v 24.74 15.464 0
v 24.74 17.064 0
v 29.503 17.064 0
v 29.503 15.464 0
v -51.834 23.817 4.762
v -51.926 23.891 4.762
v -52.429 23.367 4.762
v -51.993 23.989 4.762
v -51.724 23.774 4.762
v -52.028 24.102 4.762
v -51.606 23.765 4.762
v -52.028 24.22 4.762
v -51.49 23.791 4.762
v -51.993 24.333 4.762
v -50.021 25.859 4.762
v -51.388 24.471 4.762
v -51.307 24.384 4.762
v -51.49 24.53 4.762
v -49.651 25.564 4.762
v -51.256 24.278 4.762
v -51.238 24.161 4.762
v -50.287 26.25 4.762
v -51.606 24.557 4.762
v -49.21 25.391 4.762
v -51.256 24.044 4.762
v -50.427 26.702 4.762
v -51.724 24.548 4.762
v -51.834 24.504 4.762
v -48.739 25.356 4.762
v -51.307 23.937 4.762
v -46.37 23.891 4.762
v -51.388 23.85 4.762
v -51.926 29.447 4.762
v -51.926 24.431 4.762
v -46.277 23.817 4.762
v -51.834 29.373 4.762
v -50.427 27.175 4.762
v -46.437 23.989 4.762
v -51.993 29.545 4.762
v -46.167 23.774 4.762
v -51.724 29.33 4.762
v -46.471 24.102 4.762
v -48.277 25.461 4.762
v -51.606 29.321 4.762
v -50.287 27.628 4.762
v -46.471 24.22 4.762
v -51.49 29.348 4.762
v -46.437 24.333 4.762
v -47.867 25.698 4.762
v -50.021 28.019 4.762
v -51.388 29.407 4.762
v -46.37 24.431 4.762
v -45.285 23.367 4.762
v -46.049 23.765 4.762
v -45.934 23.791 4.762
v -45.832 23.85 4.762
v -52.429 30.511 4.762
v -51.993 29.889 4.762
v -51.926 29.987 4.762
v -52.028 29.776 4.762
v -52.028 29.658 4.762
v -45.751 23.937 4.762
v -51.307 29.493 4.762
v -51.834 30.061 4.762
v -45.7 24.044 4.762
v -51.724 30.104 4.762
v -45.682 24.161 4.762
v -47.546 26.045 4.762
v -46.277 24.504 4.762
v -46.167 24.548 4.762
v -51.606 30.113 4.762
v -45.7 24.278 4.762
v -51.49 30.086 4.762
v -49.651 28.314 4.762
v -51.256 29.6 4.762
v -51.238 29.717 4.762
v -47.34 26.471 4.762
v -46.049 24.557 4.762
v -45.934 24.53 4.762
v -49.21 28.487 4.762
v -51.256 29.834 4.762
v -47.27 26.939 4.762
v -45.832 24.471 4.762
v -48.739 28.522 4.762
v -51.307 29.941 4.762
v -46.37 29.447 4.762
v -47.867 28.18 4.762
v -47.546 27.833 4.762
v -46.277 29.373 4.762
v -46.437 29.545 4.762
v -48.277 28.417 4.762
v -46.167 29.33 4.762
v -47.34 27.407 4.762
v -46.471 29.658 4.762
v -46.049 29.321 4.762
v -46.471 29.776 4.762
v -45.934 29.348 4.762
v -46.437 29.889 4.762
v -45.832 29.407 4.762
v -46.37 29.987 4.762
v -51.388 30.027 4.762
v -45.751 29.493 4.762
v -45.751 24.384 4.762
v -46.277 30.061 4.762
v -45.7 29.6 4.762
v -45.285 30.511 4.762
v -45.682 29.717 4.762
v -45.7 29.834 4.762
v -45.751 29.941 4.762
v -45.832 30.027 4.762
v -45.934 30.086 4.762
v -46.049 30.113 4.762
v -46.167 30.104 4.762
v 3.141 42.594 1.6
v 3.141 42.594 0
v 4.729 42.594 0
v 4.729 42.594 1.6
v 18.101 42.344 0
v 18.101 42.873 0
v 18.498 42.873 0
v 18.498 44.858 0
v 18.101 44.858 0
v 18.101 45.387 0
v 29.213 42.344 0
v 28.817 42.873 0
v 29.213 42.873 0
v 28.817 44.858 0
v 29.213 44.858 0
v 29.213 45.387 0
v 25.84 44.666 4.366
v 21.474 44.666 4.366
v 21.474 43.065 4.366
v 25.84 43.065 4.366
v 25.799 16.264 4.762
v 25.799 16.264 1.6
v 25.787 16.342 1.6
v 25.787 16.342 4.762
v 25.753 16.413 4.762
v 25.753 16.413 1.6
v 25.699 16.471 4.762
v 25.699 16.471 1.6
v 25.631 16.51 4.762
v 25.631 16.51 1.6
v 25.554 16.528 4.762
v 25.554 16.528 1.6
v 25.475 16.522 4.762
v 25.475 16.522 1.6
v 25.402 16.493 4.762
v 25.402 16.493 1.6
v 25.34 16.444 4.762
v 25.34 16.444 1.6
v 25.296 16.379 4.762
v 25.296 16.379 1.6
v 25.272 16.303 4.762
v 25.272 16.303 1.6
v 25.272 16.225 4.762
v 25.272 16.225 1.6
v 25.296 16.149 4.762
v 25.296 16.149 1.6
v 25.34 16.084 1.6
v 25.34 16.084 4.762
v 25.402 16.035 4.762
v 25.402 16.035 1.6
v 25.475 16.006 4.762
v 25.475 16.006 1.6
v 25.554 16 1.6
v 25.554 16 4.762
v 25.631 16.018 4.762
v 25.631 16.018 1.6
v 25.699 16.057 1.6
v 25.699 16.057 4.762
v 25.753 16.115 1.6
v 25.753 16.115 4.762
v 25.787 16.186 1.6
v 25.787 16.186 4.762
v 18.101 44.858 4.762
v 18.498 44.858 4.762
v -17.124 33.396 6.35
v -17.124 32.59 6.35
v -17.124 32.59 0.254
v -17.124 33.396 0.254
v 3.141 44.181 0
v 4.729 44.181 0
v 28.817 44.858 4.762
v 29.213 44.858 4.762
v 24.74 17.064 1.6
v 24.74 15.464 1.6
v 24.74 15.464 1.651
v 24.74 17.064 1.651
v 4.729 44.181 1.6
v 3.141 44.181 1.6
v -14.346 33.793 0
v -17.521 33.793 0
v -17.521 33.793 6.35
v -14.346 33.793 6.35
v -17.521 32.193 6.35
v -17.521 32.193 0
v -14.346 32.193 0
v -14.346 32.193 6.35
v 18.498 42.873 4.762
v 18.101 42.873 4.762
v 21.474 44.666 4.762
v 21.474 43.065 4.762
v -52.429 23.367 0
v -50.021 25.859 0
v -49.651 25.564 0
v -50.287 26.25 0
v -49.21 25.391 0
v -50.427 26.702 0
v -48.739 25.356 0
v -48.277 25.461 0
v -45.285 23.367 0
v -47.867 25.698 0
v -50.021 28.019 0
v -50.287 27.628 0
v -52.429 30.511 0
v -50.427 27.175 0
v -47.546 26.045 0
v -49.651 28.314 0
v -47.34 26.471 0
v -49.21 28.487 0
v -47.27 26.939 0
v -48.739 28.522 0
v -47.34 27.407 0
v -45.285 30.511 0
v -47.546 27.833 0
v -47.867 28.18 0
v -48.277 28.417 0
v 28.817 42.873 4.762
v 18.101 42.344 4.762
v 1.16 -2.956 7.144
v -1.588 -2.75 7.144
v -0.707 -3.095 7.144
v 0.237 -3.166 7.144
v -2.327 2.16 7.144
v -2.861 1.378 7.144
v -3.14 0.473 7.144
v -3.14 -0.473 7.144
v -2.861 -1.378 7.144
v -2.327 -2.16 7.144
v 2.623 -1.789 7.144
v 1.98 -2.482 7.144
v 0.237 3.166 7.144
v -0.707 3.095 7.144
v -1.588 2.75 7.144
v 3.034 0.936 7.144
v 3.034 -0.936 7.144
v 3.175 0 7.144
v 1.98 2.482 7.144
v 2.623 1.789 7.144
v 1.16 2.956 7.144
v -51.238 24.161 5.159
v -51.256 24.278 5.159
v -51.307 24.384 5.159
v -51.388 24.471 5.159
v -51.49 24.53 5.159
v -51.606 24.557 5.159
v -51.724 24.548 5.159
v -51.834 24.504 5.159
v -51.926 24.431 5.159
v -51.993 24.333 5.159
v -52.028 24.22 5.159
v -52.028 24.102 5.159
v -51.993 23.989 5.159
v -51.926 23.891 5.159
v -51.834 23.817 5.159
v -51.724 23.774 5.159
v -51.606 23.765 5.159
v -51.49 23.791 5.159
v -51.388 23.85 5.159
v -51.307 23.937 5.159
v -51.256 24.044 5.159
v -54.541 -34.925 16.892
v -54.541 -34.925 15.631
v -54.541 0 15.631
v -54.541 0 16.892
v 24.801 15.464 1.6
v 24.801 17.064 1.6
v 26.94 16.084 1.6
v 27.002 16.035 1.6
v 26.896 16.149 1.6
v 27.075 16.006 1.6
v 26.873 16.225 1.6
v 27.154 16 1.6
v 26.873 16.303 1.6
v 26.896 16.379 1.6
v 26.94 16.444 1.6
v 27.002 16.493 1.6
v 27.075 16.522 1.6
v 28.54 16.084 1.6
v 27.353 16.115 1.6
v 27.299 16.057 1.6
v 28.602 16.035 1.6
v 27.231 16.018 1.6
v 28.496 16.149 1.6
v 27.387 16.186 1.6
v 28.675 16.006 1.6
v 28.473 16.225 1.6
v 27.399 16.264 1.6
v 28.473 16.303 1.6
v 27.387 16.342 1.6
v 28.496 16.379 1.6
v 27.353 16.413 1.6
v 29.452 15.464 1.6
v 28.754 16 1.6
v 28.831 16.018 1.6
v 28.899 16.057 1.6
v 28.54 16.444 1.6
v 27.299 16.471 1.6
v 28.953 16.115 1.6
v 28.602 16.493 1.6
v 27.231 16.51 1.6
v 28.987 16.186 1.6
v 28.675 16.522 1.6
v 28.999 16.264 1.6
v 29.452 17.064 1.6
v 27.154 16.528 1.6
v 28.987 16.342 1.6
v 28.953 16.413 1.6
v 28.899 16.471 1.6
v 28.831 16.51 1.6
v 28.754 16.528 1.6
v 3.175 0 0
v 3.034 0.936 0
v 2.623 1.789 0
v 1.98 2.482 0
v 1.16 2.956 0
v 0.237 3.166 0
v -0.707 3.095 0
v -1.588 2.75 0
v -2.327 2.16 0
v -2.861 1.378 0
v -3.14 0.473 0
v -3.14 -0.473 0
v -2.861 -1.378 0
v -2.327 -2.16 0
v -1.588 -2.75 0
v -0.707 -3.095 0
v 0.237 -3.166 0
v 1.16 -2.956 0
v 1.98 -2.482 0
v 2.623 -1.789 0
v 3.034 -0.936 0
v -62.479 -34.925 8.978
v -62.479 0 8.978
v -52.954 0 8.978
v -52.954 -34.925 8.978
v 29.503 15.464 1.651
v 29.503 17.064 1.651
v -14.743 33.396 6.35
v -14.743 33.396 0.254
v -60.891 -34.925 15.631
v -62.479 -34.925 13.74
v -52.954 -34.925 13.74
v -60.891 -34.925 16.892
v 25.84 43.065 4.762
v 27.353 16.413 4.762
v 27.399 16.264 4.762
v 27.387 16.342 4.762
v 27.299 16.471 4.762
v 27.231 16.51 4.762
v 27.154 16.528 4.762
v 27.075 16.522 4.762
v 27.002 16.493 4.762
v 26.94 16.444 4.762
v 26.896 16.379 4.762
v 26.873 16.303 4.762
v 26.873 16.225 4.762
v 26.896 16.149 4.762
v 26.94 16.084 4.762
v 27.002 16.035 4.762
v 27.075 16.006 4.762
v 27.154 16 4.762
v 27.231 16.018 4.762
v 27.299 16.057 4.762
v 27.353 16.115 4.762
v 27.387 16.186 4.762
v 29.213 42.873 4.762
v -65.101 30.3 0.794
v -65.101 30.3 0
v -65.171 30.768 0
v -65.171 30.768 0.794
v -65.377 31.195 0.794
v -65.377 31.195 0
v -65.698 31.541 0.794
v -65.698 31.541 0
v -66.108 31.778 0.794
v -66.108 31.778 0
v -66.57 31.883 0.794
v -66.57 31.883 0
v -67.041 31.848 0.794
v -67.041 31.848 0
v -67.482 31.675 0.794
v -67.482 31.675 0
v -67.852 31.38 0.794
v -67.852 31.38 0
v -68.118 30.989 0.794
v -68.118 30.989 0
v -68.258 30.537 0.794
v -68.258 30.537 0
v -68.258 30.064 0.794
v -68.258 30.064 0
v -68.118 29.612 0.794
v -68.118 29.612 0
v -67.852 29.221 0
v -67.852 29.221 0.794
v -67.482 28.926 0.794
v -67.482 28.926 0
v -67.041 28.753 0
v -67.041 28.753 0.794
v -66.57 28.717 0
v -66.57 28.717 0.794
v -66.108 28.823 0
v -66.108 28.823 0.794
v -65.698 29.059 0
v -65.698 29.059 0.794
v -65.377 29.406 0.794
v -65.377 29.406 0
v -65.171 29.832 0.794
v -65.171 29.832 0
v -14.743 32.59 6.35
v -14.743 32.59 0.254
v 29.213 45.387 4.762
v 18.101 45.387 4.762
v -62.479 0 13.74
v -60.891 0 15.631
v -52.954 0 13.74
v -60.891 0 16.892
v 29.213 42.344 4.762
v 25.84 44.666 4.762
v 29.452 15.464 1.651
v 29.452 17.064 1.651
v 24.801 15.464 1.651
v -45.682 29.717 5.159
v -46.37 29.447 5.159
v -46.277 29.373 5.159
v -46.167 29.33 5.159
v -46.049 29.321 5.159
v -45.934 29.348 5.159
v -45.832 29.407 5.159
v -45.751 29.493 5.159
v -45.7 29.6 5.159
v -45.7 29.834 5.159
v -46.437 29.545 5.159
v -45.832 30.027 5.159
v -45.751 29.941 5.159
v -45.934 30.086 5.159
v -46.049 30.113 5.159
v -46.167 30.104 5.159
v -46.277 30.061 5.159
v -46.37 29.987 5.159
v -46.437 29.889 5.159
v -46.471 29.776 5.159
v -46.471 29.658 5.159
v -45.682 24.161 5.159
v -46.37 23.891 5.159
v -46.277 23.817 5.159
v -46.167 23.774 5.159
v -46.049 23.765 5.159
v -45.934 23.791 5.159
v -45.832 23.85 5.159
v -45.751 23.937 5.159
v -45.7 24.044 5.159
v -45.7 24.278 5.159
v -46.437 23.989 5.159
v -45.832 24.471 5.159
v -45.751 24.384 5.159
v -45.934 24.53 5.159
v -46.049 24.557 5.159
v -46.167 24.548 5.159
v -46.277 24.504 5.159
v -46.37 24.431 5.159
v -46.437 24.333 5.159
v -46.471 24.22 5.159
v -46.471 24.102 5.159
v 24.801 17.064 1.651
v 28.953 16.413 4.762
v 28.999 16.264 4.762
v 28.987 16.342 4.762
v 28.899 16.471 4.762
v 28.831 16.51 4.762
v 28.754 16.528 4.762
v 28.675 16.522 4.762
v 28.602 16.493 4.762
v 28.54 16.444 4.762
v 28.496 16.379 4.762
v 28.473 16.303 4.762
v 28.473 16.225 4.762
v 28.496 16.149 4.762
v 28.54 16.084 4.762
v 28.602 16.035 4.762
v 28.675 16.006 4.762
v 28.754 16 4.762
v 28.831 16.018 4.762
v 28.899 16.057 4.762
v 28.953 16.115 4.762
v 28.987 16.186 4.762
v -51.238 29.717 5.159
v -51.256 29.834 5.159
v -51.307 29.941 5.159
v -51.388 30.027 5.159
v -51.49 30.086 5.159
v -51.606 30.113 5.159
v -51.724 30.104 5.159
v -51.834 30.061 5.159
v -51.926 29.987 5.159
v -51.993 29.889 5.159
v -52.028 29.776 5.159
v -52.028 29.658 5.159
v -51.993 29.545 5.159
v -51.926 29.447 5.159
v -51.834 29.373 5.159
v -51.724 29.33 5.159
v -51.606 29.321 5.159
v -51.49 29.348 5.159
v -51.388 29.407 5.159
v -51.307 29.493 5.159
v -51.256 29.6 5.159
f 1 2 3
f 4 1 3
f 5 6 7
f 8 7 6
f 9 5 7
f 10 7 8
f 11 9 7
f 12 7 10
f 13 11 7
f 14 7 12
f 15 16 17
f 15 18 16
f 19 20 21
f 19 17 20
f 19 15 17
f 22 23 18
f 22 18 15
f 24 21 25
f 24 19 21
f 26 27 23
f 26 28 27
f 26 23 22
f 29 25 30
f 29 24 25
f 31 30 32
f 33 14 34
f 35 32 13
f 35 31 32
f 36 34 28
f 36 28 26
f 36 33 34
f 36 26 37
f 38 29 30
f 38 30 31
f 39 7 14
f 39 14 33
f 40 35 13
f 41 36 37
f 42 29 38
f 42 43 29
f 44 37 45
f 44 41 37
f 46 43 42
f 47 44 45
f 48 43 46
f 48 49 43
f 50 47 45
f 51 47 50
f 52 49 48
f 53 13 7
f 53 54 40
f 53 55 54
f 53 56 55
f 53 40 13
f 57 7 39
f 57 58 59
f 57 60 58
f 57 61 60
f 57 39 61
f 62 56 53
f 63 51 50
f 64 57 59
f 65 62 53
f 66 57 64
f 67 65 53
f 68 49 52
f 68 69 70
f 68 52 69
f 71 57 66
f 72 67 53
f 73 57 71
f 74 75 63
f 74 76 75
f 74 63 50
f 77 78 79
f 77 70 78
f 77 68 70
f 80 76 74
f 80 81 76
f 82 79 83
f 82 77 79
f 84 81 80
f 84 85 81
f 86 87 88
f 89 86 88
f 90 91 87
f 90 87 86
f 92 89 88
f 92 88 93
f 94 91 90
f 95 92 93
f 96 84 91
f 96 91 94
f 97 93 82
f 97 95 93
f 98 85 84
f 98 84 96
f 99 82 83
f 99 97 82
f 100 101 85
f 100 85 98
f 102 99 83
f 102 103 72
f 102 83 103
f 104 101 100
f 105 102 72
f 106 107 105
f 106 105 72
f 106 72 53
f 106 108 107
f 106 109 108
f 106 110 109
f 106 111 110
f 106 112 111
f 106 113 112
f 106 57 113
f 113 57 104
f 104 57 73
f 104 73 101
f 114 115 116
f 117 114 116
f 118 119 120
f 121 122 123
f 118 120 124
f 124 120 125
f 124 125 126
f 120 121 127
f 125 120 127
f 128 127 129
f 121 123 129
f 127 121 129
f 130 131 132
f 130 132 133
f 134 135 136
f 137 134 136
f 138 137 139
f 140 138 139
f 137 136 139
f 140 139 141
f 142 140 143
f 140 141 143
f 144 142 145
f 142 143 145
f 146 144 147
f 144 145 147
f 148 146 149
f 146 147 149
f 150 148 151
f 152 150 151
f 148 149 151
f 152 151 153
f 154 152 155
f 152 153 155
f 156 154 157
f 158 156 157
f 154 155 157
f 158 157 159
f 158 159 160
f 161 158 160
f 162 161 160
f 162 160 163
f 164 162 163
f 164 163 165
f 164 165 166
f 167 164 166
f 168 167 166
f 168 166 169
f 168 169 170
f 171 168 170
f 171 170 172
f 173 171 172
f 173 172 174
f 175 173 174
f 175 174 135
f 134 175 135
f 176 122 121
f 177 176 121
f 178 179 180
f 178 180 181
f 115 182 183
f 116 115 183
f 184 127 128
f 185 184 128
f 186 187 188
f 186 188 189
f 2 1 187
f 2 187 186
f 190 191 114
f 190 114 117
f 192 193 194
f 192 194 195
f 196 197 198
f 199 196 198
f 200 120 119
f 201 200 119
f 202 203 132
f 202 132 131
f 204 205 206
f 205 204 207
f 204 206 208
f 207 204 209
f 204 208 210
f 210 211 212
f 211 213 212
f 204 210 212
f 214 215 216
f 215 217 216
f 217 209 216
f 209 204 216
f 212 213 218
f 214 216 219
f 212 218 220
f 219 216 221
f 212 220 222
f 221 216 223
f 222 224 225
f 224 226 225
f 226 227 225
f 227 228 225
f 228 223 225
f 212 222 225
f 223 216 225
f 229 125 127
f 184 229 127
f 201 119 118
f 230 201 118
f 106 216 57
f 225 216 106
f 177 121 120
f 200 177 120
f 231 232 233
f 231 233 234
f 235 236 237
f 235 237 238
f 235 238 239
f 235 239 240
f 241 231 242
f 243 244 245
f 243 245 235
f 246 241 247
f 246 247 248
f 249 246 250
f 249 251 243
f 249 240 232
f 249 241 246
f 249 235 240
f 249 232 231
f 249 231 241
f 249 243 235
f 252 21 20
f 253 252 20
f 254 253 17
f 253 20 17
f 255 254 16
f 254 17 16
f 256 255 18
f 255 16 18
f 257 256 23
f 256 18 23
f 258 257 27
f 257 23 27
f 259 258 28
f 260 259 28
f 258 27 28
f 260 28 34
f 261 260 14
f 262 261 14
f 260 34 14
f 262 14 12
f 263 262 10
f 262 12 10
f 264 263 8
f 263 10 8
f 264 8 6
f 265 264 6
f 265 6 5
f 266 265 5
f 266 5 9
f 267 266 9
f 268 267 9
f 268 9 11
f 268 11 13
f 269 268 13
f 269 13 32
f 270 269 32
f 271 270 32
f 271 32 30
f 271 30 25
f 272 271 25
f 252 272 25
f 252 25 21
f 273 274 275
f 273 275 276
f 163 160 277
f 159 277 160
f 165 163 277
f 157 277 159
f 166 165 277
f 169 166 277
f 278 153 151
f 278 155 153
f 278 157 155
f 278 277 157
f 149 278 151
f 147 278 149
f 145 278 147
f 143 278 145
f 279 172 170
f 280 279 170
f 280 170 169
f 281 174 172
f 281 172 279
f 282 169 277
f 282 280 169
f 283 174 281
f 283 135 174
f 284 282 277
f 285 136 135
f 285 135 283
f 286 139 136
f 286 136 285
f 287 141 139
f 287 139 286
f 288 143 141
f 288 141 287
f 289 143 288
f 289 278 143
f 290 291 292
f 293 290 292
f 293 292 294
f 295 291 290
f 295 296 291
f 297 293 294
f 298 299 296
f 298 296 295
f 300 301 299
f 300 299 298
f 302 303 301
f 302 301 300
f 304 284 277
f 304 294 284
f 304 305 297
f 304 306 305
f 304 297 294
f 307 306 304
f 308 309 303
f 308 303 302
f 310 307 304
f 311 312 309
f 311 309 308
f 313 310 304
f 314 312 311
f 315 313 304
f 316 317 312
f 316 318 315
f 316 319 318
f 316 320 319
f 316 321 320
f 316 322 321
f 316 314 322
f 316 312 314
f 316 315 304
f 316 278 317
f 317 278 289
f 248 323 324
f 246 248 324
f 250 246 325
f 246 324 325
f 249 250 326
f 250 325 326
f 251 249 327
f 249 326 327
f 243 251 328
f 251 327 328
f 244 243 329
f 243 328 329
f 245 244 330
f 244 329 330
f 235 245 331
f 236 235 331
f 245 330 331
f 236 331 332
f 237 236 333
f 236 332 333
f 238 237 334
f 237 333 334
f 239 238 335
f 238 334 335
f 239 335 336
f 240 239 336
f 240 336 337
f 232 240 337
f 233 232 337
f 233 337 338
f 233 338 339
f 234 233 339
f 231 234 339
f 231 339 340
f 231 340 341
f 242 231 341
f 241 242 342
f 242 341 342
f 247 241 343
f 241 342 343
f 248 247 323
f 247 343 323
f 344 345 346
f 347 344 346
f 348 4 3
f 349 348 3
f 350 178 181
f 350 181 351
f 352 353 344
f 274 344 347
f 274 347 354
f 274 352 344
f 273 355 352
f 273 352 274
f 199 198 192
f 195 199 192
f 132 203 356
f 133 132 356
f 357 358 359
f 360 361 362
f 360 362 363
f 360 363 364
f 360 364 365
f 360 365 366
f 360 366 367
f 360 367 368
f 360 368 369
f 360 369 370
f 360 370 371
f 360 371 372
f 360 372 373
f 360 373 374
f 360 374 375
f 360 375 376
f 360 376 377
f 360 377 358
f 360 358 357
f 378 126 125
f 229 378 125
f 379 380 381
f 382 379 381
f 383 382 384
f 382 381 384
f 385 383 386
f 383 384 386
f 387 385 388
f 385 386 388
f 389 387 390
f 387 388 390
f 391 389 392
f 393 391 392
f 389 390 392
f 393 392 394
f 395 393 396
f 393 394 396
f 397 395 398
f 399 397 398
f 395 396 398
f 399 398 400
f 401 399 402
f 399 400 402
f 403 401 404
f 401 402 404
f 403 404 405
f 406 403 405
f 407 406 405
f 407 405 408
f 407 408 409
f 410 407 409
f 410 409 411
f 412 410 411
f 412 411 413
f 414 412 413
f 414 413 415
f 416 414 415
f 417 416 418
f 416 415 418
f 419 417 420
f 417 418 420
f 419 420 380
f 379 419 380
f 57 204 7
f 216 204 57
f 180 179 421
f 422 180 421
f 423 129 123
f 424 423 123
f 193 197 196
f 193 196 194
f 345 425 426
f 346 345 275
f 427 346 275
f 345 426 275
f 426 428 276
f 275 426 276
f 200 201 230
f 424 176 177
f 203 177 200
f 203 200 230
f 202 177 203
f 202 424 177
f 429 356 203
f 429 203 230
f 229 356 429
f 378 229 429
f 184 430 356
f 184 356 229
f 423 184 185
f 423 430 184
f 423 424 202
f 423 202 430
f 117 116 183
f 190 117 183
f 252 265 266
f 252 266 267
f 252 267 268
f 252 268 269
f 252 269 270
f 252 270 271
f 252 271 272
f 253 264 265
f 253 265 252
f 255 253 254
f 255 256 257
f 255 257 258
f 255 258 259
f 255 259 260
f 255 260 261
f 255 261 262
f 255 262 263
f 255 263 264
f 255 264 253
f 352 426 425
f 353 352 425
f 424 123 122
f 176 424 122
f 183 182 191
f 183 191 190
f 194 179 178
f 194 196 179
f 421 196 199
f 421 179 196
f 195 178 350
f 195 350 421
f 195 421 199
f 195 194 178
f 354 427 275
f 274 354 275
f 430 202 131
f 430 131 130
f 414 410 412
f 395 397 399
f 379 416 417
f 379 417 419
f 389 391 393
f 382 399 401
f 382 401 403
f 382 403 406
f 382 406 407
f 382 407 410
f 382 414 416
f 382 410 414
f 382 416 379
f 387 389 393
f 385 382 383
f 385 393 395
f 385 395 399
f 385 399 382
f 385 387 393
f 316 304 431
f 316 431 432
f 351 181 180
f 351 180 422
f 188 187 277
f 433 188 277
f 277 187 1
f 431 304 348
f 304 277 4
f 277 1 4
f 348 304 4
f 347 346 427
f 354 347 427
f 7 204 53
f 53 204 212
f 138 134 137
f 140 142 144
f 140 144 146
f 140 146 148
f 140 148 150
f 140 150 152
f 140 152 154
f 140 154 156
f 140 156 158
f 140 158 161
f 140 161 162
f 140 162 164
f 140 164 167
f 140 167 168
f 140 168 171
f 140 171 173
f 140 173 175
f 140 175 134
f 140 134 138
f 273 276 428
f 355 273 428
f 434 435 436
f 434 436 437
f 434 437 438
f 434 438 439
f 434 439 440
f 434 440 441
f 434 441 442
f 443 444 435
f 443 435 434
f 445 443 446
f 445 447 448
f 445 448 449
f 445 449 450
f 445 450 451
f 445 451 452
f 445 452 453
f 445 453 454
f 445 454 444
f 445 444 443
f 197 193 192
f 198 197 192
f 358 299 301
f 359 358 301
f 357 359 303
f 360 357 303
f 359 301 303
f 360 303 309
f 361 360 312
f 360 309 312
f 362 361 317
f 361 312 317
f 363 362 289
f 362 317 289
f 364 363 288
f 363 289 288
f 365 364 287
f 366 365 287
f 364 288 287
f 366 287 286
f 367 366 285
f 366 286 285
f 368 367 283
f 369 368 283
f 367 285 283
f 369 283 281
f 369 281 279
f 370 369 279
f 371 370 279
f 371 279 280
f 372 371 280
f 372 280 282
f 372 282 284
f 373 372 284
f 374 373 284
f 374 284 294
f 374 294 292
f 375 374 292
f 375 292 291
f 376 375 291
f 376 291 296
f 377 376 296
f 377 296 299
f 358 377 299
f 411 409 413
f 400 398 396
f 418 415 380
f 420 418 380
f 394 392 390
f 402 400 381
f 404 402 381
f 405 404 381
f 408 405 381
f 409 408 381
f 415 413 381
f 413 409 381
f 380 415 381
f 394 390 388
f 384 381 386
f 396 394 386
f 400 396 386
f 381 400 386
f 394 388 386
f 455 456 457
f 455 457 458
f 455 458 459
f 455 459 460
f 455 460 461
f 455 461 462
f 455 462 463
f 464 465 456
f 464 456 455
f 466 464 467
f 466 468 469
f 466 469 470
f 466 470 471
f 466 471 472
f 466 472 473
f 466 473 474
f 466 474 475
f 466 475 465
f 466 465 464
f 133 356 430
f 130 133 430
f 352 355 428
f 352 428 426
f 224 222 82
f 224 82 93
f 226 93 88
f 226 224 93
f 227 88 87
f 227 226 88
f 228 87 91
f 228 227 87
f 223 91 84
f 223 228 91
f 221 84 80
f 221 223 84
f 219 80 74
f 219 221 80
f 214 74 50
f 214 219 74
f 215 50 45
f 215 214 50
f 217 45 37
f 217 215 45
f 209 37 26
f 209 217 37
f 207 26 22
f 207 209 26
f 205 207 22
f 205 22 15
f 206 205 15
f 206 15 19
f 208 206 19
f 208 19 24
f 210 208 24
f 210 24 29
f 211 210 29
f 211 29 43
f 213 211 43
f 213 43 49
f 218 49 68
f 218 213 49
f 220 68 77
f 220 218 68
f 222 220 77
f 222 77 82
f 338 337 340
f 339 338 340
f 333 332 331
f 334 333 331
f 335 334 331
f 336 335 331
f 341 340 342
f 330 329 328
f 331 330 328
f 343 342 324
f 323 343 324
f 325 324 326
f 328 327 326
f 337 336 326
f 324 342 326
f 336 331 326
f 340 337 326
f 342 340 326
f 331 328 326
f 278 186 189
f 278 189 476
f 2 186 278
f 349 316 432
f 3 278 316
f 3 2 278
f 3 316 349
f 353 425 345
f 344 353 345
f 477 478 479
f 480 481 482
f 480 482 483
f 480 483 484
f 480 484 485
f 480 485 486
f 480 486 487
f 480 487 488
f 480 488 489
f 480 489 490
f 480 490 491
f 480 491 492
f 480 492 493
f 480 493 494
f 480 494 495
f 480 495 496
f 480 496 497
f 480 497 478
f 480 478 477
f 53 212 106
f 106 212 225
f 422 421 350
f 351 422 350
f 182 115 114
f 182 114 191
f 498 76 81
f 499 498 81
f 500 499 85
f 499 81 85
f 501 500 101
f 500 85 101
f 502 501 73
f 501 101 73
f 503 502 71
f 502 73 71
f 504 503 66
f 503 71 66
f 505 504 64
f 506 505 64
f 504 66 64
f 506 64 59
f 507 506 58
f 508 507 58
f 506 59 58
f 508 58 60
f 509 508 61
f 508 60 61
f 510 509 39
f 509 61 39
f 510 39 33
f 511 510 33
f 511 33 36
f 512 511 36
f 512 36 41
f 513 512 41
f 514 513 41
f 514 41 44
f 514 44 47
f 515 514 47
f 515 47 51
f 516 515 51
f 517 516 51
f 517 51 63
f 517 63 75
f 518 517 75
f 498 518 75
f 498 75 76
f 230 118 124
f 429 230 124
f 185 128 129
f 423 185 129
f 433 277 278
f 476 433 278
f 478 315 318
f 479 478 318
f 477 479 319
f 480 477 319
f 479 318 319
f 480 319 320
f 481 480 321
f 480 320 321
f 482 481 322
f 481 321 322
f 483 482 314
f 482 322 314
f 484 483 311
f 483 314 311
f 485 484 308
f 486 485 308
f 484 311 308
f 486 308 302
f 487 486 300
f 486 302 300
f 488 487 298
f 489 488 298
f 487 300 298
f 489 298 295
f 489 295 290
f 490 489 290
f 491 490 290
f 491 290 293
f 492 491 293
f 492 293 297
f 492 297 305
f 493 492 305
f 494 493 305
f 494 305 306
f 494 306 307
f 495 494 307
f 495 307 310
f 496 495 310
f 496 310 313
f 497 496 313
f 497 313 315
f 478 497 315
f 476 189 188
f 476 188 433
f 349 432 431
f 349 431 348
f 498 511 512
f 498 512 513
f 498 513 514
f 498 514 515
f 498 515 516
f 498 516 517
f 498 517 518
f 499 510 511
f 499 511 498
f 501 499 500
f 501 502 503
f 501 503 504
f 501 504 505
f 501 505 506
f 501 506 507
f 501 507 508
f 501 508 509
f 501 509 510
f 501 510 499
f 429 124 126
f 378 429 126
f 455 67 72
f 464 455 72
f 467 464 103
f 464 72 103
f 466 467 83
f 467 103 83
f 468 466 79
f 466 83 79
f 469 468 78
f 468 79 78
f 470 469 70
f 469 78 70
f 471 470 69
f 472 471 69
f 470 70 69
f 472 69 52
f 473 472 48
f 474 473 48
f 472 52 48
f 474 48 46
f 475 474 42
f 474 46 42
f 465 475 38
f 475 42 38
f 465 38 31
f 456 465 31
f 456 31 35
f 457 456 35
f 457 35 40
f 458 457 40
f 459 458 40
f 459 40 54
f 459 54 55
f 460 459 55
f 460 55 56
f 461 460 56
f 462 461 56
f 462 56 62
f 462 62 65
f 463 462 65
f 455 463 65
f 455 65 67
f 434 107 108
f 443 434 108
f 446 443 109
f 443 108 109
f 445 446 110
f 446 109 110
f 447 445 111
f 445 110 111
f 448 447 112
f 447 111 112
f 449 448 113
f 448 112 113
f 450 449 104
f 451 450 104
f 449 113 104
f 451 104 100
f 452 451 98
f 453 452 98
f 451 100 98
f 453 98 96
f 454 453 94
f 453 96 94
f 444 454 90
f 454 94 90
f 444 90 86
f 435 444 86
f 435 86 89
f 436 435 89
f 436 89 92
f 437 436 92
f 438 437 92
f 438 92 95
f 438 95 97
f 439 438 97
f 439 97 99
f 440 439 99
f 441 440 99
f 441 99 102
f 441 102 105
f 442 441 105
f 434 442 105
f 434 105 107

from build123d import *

# Parameters (mm, degrees)
F0_R      = 3.175
F1_DEPTH  = 7.14375
F3_DEPTH  = 34.925
F4_W      = 7.14375
F4_H      = 7.14375
F4_R      = 0.396875
F4_R_2    = 1.5875
F5_DEPTH  = 4.7625
F6_DEPTH  = 5.159375
F8_DEPTH  = 4.7625
F9_W      = 4.365625
F9_H      = 1.6002
F10_DEPTH = 0.396875
F11_W     = 1.5875
F11_H     = 1.5875
F12_DEPTH = 1.6002
F13_W     = 4.7625
F13_H     = 1.6002
F13_R     = 0.2645833333
F14_DEPTH = 1.6002
F15_DEPTH = 4.7625
F16_W     = 3.175
F16_H     = 1.6002
F17_DEPTH = 6.35
F18_W     = 2.38125
F18_H     = 0.80645
F19_DEPTH = 6.096
F20_W     = 0.0608872609
F20_H     = 1.6002
F20_W_2   = 0.0508
F21_DEPTH = 0.0508
F22_R     = 1.5875
F23_DEPTH = 0.79375


# Not quite as in the source:
# - a length typed as a fraction of an inch, garbled in the dataset ("3 / 203.2 mm" for 3/8 in), is restored


with BuildPart() as f1:
    # F0 (on Top) → F1 (new body)
    with BuildSketch(Plane.XY):
        Circle(F0_R)
    extrude(amount=F1_DEPTH)


with BuildPart() as f3:
    # F2 (on Front) → F3 (new body)
    with BuildSketch(Plane.XZ):
        Polygon((-60.8911556599, 15.6311627035), (-62.4786556599, 13.7401700254), (-62.4786556599, 8.9776700254), (-52.9536556599, 8.9776700254), (-52.9536556599, 13.7401700254), (-54.5411556599, 15.6311627035), (-54.5411556599, 16.8918247443), (-60.8911556599, 16.8918247443), align=None)
    extrude(amount=F3_DEPTH)


with BuildPart() as f5:
    # F4 (on Top) → F5 (new body)
    with BuildSketch(Plane.XY):
        with Locations((-48.8571682945, 26.9388640299)):
            Rectangle(F4_W, F4_H)
        with Locations((-51.6352932945, 24.1607390299)):
            Circle(F4_R, mode=Mode.SUBTRACT)
        with Locations((-46.0790432945, 24.1607390299)):
            Circle(F4_R, mode=Mode.SUBTRACT)
        with Locations((-51.6352932945, 29.7169890299)):
            Circle(F4_R, mode=Mode.SUBTRACT)
        with Locations((-48.8571682945, 26.9388640299)):
            Circle(F4_R_2, mode=Mode.SUBTRACT)
        with Locations((-46.0790432945, 29.7169890299)):
            Circle(F4_R, mode=Mode.SUBTRACT)
    extrude(amount=F5_DEPTH)

    # F4 (on Top) → F6 (join)
    with BuildSketch(Plane.XY):
        with Locations((-51.6352932945, 29.7169890299)):
            Circle(F4_R)
        with Locations((-46.0790432945, 29.7169890299)):
            Circle(F4_R)
        with Locations((-46.0790432945, 24.1607390299)):
            Circle(F4_R)
        with Locations((-51.6352932945, 24.1607390299)):
            Circle(F4_R)
    extrude(amount=F6_DEPTH)


with BuildPart() as f8:
    # F7 (on Top) → F8 (new body)
    with BuildSketch(Plane.XY):
        Polygon((29.2134701102, 45.3868062362), (18.1009701102, 45.3868062362), (18.1009701102, 44.8576395696), (18.4978451102, 44.8576395696), (18.4978451102, 42.8732645696), (18.1009701102, 42.8732645696), (18.1009701102, 42.3440979029), (29.2134701102, 42.3440979029), (29.2134701102, 42.8732645696), (28.8165951102, 42.8732645696), (28.8165951102, 44.8576395696), (29.2134701102, 44.8576395696), align=None)
    extrude(amount=F8_DEPTH)

    # F9 (on face) → F10 (cut)
    with BuildSketch(Plane.XY.offset(4.7625)):
        with Locations((23.6572201102, 43.8654520696)):
            Rectangle(F9_W, F9_H)
    extrude(amount=-F10_DEPTH, mode=Mode.SUBTRACT)


with BuildPart() as f12:
    # F11 (on Top) → F12 (new body)
    with BuildSketch(Plane.XY):
        with Locations((3.9349747822, 43.3876775205)):
            Rectangle(F11_W, F11_H)
    extrude(amount=F12_DEPTH)


with BuildPart() as f14:
    # F13 (on Top) → F14 (new body)
    with BuildSketch(Plane.XY):
        with Locations((27.1214717252, 16.2639711052)):
            Rectangle(F13_W, F13_H)
        with Locations((25.5339717252, 16.2639711052)):
            Circle(F13_R, mode=Mode.SUBTRACT)
        with Locations((27.1341717252, 16.2639711052)):
            Circle(F13_R, mode=Mode.SUBTRACT)
        with Locations((28.7343717252, 16.2639711052)):
            Circle(F13_R, mode=Mode.SUBTRACT)
    extrude(amount=F14_DEPTH)

    # F13 (on Top) → F15 (join)
    with BuildSketch(Plane.XY):
        with Locations((25.5339717252, 16.2639711052)):
            Circle(F13_R)
        with Locations((27.1341717252, 16.2639711052)):
            Circle(F13_R)
        with Locations((28.7343717252, 16.2639711052)):
            Circle(F13_R)
    extrude(amount=F15_DEPTH)

    # F20 (on face) → F21 (join)
    with BuildSketch(Plane.XY.offset(1.6002)):
        with Locations((24.7706653557, 16.2639711052)):
            Rectangle(F20_W, F20_H)
        with Locations((29.4773217252, 16.2639711052)):
            Rectangle(F20_W_2, F20_H)
    extrude(amount=F21_DEPTH)


with BuildPart() as f17:
    # F16 (on Top) → F17 (new body)
    with BuildSketch(Plane.XY):
        with Locations((-15.9334428608, 32.9927906)):
            Rectangle(F16_W, F16_H)
    extrude(amount=F17_DEPTH)

    # F18 (on face) → F19 (cut)
    with BuildSketch(Plane.XY.offset(6.35)):
        with Locations((-15.9334428608, 32.9927906)):
            Rectangle(F18_W, F18_H)
    extrude(amount=-F19_DEPTH, mode=Mode.SUBTRACT)


with BuildPart() as f23:
    # F22 (on Top) → F23 (new body)
    with BuildSketch(Plane.XY):
        with Locations((-66.6881874204, 30.300328508)):
            Circle(F22_R)
    extrude(amount=F23_DEPTH)


solid = Compound([f1.part, f3.part, f5.part, f8.part, f12.part, f14.part, f17.part, f23.part])
